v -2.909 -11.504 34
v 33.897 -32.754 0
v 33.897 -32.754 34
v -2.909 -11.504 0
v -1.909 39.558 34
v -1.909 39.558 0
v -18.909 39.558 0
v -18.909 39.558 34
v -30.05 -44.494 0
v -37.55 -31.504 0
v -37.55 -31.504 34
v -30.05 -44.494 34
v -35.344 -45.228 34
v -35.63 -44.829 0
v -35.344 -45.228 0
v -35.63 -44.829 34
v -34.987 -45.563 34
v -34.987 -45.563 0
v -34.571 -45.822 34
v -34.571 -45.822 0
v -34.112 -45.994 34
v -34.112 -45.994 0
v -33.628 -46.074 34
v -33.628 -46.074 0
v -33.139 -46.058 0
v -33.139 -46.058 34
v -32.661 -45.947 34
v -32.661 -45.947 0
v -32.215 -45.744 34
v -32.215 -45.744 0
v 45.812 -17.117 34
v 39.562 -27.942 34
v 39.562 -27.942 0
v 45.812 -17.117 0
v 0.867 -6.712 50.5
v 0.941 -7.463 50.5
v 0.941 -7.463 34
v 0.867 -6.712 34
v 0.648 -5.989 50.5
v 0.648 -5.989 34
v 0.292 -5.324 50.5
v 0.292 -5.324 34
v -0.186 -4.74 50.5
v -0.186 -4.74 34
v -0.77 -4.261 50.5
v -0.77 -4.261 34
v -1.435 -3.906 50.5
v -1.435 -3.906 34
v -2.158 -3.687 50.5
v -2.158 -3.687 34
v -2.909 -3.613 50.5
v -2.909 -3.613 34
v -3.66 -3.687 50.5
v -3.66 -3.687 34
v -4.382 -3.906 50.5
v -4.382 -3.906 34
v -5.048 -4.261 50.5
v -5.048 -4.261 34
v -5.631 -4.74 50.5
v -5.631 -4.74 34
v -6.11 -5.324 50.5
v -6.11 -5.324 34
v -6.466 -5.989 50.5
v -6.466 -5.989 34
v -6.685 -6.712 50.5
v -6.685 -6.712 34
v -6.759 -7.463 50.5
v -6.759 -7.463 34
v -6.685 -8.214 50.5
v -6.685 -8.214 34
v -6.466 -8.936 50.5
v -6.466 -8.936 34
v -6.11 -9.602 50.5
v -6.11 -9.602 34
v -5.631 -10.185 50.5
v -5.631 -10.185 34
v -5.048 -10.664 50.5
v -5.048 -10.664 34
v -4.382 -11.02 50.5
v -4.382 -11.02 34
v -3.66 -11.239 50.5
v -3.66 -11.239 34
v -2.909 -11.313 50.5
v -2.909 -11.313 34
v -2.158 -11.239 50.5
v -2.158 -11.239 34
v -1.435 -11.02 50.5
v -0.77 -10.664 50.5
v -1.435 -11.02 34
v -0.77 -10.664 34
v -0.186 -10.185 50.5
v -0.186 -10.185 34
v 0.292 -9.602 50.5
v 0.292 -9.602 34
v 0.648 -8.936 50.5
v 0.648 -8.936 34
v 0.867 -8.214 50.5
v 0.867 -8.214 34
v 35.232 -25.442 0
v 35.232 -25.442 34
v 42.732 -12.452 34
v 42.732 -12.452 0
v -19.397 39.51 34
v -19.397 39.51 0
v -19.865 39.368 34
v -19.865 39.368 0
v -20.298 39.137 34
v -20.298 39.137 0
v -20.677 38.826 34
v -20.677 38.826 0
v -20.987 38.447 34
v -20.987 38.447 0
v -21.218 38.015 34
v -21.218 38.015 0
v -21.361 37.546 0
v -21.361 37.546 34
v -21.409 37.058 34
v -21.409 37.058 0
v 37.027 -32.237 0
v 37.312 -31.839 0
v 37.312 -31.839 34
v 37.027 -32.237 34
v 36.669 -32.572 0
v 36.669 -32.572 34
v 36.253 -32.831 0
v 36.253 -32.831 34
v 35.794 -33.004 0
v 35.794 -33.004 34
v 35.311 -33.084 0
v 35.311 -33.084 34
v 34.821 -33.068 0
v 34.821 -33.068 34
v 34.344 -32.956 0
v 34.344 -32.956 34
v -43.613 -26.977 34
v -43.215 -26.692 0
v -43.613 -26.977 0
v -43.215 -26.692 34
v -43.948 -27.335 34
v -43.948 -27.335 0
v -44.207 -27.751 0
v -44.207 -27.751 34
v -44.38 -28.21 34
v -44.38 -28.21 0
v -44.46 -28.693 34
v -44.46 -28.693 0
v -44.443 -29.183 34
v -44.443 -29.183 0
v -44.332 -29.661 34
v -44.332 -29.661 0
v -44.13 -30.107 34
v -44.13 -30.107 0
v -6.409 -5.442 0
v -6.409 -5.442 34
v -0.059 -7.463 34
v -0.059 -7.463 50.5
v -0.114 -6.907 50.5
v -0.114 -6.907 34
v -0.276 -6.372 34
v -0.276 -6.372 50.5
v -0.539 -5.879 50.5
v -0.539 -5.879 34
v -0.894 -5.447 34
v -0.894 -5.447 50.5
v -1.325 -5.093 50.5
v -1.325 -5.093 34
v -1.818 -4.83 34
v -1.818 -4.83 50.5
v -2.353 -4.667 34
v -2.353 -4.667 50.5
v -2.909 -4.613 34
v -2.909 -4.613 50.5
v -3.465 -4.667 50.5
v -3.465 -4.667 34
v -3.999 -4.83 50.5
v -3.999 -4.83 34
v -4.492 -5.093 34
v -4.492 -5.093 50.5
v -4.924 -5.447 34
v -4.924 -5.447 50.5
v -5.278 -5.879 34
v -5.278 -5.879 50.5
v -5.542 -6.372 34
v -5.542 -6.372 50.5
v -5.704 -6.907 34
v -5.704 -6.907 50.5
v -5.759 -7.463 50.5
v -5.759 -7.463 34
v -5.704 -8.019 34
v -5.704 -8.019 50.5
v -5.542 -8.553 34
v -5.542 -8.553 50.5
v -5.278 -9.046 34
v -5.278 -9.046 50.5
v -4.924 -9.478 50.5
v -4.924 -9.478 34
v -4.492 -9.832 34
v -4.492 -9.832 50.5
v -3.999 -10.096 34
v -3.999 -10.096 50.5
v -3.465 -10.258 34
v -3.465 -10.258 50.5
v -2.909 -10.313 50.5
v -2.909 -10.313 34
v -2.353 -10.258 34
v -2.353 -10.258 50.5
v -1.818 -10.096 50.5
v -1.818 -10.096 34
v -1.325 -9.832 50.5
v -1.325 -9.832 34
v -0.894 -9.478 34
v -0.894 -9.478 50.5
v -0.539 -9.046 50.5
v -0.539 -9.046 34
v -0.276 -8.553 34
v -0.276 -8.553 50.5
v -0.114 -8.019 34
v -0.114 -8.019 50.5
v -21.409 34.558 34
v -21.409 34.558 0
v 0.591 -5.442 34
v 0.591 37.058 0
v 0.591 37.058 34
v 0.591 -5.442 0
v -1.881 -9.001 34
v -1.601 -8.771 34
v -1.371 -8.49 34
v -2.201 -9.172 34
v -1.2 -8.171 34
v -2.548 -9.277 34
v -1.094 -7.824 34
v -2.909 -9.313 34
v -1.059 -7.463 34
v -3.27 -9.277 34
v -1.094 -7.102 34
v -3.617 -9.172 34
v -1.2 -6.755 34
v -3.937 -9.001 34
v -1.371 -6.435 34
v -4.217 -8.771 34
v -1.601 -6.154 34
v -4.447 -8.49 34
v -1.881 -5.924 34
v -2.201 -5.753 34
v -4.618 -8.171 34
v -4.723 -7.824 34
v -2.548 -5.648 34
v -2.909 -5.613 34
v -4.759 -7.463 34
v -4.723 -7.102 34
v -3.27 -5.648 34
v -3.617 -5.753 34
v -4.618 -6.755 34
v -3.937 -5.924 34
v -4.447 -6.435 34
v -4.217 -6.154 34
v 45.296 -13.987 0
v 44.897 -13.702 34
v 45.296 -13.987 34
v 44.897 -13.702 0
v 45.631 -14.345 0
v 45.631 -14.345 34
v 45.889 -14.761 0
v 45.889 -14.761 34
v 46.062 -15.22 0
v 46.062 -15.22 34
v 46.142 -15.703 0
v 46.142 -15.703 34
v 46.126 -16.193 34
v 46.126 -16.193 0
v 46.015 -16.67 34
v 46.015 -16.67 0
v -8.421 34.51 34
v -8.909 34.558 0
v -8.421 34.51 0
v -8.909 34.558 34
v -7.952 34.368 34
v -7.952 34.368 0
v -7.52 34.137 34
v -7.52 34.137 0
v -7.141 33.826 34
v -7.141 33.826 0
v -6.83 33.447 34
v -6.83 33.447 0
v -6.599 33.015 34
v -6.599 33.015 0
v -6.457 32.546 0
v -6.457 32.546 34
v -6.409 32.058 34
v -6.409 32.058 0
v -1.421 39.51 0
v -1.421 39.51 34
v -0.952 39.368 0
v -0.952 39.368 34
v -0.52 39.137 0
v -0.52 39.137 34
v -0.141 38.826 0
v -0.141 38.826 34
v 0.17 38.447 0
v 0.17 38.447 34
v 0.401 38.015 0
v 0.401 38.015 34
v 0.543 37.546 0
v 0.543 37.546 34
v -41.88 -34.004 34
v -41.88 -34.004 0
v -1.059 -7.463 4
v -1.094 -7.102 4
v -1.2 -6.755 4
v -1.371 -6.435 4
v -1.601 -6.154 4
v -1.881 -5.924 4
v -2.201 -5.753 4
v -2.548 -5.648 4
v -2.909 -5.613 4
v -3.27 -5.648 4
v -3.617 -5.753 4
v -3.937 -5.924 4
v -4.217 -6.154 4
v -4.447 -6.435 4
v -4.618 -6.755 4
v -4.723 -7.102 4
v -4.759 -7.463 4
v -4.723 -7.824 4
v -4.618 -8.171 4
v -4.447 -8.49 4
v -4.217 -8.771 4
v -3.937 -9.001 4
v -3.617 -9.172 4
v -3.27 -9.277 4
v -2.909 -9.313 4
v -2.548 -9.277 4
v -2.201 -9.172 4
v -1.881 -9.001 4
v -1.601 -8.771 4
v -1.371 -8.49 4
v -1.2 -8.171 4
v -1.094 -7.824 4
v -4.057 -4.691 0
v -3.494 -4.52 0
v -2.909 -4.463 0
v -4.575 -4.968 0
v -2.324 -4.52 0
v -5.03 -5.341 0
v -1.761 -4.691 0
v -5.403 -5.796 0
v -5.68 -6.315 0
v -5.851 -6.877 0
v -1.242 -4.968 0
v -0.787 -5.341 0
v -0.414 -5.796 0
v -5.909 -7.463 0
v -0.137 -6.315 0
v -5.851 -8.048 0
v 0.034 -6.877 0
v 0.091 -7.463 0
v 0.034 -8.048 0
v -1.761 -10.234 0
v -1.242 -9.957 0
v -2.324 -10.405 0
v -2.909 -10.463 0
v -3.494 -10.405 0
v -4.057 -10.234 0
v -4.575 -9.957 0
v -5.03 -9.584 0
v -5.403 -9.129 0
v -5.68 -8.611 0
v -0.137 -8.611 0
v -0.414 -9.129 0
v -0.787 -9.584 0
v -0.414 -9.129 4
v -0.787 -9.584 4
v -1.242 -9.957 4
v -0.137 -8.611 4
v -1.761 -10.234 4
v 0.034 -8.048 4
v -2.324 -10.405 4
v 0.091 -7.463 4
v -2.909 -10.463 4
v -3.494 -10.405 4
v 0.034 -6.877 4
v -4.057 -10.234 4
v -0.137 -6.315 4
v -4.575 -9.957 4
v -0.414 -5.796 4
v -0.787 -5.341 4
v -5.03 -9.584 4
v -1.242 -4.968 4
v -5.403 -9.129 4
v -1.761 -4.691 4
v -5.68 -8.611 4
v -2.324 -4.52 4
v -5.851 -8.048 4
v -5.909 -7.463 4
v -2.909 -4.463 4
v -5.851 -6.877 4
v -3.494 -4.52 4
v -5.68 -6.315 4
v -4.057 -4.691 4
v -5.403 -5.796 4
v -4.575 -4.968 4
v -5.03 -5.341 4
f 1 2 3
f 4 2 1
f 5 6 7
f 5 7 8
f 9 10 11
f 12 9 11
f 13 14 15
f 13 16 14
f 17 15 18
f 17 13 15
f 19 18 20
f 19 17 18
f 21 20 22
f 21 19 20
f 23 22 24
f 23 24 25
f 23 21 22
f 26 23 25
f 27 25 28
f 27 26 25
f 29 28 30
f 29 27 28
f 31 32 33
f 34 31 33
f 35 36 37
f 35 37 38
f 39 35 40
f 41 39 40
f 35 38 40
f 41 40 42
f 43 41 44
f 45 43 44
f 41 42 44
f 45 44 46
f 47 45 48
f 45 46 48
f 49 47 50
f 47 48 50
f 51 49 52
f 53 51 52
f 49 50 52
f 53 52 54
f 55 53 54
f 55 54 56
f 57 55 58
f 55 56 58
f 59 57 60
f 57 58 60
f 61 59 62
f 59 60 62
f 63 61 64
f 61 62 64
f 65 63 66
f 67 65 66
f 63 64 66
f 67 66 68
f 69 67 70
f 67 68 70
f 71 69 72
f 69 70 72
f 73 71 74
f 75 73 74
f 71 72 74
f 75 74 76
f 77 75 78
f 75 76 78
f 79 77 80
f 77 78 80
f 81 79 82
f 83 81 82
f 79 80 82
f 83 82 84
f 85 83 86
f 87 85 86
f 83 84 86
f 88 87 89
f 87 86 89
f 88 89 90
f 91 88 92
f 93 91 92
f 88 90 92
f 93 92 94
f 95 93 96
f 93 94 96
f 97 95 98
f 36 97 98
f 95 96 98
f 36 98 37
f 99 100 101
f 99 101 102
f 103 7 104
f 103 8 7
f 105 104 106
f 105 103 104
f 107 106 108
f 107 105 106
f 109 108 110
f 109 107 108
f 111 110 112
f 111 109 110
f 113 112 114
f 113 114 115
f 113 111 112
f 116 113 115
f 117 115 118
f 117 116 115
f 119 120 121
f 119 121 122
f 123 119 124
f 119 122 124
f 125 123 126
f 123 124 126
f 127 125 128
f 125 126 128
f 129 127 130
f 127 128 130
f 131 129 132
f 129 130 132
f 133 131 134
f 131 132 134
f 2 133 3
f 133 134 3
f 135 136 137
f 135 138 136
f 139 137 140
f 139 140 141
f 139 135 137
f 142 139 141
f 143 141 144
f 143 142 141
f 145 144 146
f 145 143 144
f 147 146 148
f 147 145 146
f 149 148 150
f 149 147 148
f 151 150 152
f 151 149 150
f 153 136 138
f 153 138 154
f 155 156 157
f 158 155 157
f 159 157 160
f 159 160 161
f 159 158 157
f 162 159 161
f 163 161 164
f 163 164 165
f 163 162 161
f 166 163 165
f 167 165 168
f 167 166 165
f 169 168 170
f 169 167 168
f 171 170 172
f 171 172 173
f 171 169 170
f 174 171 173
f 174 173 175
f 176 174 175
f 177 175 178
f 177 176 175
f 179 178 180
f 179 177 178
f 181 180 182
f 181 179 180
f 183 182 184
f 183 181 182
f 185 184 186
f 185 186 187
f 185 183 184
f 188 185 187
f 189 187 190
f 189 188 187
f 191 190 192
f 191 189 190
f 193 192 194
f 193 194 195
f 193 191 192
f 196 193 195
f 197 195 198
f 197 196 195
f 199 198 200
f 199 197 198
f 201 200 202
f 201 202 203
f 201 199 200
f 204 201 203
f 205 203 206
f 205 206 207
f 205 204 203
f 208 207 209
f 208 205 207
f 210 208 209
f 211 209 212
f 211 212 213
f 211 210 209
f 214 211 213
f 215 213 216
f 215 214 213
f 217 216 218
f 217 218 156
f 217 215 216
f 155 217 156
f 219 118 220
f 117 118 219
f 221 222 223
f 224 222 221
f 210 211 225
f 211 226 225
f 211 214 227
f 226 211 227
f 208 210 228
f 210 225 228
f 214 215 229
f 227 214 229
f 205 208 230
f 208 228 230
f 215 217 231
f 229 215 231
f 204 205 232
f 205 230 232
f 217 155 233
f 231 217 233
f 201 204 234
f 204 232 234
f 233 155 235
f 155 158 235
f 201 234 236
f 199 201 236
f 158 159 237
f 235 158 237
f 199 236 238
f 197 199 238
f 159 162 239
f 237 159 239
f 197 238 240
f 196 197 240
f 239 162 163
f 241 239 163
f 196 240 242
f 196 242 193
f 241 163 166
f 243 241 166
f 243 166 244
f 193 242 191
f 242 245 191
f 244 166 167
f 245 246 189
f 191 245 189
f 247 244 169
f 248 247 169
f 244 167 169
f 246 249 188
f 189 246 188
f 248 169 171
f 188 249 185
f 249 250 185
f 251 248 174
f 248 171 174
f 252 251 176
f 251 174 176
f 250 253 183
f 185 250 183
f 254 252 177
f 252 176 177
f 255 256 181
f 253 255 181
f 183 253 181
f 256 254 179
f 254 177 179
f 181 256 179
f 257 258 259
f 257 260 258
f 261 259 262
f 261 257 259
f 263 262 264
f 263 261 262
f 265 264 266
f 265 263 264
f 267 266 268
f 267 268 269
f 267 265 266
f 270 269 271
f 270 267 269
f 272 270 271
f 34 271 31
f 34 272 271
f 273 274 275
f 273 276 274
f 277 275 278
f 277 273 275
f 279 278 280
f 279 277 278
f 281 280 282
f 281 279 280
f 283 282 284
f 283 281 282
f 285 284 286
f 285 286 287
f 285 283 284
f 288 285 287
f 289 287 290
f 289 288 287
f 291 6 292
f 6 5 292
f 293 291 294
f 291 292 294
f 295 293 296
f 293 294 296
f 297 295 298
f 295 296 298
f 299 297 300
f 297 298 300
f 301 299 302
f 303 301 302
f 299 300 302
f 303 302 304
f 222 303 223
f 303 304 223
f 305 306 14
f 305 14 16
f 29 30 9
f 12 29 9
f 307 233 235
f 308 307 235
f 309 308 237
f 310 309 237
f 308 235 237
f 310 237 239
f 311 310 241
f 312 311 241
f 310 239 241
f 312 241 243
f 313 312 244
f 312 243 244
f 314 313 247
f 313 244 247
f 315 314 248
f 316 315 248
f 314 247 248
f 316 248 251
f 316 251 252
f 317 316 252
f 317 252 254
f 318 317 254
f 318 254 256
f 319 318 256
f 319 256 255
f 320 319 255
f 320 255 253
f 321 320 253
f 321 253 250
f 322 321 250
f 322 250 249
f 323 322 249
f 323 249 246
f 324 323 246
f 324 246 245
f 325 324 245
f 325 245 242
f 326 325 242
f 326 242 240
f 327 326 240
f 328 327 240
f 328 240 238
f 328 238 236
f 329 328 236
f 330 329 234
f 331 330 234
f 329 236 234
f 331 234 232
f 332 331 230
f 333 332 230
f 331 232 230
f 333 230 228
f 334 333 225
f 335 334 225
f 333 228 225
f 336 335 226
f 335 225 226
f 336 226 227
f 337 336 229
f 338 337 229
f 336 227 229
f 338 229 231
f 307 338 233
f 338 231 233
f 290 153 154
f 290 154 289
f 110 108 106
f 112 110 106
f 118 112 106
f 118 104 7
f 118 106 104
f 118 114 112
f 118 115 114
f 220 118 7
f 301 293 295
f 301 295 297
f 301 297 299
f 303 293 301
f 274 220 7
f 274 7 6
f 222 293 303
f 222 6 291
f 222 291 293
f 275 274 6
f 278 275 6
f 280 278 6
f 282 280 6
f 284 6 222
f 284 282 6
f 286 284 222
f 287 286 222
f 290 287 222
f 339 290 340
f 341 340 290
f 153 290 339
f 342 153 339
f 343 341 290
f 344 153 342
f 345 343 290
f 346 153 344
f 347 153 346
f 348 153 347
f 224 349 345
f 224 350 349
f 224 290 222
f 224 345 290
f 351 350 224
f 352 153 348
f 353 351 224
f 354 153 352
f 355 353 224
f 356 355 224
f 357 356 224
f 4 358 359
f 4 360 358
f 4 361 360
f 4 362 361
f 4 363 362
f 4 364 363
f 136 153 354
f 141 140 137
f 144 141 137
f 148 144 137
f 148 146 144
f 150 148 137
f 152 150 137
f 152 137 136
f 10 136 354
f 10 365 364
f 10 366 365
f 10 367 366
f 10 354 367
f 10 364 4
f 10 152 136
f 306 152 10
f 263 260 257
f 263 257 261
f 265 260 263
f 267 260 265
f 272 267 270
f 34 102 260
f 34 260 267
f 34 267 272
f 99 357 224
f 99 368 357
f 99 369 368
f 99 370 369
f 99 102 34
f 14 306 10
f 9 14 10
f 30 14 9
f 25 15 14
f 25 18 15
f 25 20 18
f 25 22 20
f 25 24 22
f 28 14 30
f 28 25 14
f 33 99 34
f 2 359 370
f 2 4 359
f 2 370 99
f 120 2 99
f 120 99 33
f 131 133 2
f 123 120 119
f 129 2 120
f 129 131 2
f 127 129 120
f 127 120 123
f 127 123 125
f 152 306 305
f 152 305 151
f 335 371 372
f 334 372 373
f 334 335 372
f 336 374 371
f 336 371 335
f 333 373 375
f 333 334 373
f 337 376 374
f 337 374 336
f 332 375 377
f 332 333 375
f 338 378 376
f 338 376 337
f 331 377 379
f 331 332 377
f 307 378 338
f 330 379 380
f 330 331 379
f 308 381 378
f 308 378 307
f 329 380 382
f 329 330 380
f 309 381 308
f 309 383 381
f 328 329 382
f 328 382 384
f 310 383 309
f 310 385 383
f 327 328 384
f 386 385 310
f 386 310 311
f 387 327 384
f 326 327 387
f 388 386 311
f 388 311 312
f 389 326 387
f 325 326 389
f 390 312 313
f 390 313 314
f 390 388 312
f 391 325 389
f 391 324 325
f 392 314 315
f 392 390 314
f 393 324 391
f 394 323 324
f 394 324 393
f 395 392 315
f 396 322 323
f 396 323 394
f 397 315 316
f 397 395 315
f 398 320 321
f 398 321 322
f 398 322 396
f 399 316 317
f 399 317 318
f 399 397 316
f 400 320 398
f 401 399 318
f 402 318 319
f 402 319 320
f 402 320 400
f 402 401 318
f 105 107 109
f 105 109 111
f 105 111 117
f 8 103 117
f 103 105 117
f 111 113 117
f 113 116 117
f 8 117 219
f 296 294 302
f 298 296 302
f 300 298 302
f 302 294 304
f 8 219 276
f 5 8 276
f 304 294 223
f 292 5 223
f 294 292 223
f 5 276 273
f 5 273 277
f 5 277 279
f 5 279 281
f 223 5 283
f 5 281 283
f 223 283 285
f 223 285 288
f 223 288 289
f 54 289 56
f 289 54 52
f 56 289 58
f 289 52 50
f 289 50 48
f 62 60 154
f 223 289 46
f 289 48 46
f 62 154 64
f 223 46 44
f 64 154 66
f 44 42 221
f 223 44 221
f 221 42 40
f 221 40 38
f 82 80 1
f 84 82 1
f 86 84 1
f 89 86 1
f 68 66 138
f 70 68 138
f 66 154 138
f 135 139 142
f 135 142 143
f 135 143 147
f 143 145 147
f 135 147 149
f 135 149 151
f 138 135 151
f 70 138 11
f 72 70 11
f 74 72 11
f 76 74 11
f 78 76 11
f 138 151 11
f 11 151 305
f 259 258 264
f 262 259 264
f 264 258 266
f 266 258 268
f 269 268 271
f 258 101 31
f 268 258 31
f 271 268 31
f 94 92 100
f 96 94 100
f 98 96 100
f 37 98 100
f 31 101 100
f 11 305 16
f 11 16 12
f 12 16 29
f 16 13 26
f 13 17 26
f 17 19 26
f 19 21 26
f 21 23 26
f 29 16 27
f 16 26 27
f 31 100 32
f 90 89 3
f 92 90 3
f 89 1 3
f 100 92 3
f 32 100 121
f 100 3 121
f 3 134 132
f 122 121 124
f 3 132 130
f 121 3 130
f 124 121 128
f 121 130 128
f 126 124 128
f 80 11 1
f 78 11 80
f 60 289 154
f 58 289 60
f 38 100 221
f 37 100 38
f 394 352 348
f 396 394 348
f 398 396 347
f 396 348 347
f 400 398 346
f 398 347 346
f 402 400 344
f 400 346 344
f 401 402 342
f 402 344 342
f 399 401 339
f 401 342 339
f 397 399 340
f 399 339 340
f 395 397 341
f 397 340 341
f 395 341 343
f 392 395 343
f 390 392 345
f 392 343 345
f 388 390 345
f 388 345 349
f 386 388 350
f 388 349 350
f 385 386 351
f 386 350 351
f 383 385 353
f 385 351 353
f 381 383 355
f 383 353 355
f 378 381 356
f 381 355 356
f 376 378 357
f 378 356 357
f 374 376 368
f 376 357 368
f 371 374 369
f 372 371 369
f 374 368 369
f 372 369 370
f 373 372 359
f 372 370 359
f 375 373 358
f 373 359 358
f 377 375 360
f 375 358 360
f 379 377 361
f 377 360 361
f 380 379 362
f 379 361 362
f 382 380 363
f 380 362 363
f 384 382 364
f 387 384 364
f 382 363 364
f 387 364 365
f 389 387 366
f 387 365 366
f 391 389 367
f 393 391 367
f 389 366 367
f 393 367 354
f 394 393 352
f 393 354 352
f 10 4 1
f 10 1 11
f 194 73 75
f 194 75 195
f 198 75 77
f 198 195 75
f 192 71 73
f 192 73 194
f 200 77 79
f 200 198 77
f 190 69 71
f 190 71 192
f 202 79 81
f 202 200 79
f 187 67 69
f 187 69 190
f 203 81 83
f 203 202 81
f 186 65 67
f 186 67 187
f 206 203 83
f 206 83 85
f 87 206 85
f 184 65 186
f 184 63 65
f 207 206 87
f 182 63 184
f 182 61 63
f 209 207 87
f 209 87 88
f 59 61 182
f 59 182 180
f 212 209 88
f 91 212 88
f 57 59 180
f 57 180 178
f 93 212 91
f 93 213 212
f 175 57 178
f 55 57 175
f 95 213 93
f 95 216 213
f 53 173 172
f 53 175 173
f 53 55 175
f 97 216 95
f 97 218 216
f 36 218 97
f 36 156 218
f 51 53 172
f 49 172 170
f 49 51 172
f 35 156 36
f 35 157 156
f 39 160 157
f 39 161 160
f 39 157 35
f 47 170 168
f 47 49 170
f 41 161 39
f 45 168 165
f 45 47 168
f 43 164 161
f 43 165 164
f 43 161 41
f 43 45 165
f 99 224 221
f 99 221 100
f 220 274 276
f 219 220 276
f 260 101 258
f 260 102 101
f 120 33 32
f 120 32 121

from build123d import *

# Parameters (mm, degrees)
EXTRUDE_1_DEPTH     = 34
SKETCH_4_R          = 3.85
SKETCH_4_R_2        = 2.85
EXTRUDE_2_DEPTH     = 16.5
SKETCH_5_R          = 1.85
CUT_EXTRUDE_2_DEPTH = 35
SKETCH_6_R          = 3
CUT_EXTRUDE_3_DEPTH = 4
SKETCH_7_W          = 34
SKETCH_7_H          = 5
EXTRUDE_3_DEPTH     = 15
FILLET_2_R          = 2.5
FILLET_3_R          = 2.5
FILLET_4_R          = 2.5
SKETCH_8_W          = 5
SKETCH_8_H          = 34
EXTRUDE_4_DEPTH     = 15
SKETCH_9_W          = 5
SKETCH_9_H          = 34
EXTRUDE_5_DEPTH     = 15
FILLET_5_R          = 2.5


with BuildPart() as part:
    # 草圖1 → 填料-伸長1 (new body)
    with BuildSketch(Plane.XY):
        Polygon((0.59122025, -5.441901053), (39.56236342, -27.941901053), (36.06236342, -34.00407888), (-2.90877975, -11.50407888), (-41.87992292, -34.00407888), (-45.37992292, -27.941901053), (-6.40877975, -5.441901053), (-6.40877975, 39.558098947), (0.59122025, 39.558098947), align=None)
    extrude(amount=EXTRUDE_1_DEPTH)

    # 草圖4 → 填料-伸長2 (add)
    with BuildSketch(Plane.XY.offset(34)):
        with Locations((-2.90877975, -7.462626996)):
            Circle(SKETCH_4_R)
        with Locations((-2.90877975, -7.462626996)):
            Circle(SKETCH_4_R_2, mode=Mode.SUBTRACT)
    extrude(amount=EXTRUDE_2_DEPTH)

    # 草圖5 → 除料-伸長2 (cut, through all)
    with BuildSketch(Plane.XY.offset(34)):
        with Locations((-2.90877975, -7.462626996)):
            Circle(SKETCH_5_R)
    extrude(amount=-CUT_EXTRUDE_2_DEPTH, mode=Mode.SUBTRACT)

    # 草圖6 → 除料-伸長3 (cut)
    with BuildSketch(Plane(origin=(0, 0, 0), x_dir=(-1, 0, 0), z_dir=(0, 0, -1))):
        with Locations((2.90877975, -7.462626996)):
            Circle(SKETCH_6_R)
    extrude(amount=-CUT_EXTRUDE_3_DEPTH, mode=Mode.SUBTRACT)

    # 草圖7 → 填料-伸長3 (add)
    with BuildSketch(Plane.ZY.offset(6.40877975)):
        with Locations((17, 37.058098947)):
            Rectangle(SKETCH_7_W, SKETCH_7_H)
    extrude(amount=EXTRUDE_3_DEPTH)

    # 圓角2
    fillet_2_edges = [part.edges().sort_by_distance(p)[0] for p in [
        (-21.40877975, 39.558098947, 17),
    ]]
    fillet(fillet_2_edges, radius=FILLET_2_R)

    # 圓角3
    fillet_3_edges = [part.edges().sort_by_distance(p)[0] for p in [
        (0.59122025, 39.558098947, 17),
    ]]
    fillet(fillet_3_edges, radius=FILLET_3_R)

    # 圓角4
    fillet_4_edges = [part.edges().sort_by_distance(p)[0] for p in [
        (-6.40877975, 34.558098947, 17),
    ]]
    fillet(fillet_4_edges, radius=FILLET_4_R)

    # 草圖8 → 填料-伸長4 (add)
    with BuildSketch(Plane(origin=(4.254217341, -7.368520581, 0), x_dir=(0.866025404, 0.5, 0), z_dir=(0.5, -0.866025404, 0))):
        with Locations((-50.771116598, 17)):
            Rectangle(SKETCH_8_W, SKETCH_8_H)
    extrude(amount=EXTRUDE_4_DEPTH)

    # 草圖9 → 填料-伸長5 (add)
    with BuildSketch(Plane(origin=(-2.208607216, -3.825419912, 0), x_dir=(0.866025404, -0.5, 0), z_dir=(0.5, 0.866025404, 0))):
        with Locations((45.732962282, -17)):
            Rectangle(SKETCH_9_W, SKETCH_9_H)
    extrude(amount=EXTRUDE_5_DEPTH)

    # 圓角5
    fillet_5_edges = [part.edges().sort_by_distance(p)[0] for p in [
        (36.06236342, -34.00407888, 17),
        (-45.37992292, -27.941901053, 17),
        (-34.37992292, -46.994459937, 17),
        (47.06236342, -14.951519997, 17),
    ]]
    fillet(fillet_5_edges, radius=FILLET_5_R)


solid = part.part
